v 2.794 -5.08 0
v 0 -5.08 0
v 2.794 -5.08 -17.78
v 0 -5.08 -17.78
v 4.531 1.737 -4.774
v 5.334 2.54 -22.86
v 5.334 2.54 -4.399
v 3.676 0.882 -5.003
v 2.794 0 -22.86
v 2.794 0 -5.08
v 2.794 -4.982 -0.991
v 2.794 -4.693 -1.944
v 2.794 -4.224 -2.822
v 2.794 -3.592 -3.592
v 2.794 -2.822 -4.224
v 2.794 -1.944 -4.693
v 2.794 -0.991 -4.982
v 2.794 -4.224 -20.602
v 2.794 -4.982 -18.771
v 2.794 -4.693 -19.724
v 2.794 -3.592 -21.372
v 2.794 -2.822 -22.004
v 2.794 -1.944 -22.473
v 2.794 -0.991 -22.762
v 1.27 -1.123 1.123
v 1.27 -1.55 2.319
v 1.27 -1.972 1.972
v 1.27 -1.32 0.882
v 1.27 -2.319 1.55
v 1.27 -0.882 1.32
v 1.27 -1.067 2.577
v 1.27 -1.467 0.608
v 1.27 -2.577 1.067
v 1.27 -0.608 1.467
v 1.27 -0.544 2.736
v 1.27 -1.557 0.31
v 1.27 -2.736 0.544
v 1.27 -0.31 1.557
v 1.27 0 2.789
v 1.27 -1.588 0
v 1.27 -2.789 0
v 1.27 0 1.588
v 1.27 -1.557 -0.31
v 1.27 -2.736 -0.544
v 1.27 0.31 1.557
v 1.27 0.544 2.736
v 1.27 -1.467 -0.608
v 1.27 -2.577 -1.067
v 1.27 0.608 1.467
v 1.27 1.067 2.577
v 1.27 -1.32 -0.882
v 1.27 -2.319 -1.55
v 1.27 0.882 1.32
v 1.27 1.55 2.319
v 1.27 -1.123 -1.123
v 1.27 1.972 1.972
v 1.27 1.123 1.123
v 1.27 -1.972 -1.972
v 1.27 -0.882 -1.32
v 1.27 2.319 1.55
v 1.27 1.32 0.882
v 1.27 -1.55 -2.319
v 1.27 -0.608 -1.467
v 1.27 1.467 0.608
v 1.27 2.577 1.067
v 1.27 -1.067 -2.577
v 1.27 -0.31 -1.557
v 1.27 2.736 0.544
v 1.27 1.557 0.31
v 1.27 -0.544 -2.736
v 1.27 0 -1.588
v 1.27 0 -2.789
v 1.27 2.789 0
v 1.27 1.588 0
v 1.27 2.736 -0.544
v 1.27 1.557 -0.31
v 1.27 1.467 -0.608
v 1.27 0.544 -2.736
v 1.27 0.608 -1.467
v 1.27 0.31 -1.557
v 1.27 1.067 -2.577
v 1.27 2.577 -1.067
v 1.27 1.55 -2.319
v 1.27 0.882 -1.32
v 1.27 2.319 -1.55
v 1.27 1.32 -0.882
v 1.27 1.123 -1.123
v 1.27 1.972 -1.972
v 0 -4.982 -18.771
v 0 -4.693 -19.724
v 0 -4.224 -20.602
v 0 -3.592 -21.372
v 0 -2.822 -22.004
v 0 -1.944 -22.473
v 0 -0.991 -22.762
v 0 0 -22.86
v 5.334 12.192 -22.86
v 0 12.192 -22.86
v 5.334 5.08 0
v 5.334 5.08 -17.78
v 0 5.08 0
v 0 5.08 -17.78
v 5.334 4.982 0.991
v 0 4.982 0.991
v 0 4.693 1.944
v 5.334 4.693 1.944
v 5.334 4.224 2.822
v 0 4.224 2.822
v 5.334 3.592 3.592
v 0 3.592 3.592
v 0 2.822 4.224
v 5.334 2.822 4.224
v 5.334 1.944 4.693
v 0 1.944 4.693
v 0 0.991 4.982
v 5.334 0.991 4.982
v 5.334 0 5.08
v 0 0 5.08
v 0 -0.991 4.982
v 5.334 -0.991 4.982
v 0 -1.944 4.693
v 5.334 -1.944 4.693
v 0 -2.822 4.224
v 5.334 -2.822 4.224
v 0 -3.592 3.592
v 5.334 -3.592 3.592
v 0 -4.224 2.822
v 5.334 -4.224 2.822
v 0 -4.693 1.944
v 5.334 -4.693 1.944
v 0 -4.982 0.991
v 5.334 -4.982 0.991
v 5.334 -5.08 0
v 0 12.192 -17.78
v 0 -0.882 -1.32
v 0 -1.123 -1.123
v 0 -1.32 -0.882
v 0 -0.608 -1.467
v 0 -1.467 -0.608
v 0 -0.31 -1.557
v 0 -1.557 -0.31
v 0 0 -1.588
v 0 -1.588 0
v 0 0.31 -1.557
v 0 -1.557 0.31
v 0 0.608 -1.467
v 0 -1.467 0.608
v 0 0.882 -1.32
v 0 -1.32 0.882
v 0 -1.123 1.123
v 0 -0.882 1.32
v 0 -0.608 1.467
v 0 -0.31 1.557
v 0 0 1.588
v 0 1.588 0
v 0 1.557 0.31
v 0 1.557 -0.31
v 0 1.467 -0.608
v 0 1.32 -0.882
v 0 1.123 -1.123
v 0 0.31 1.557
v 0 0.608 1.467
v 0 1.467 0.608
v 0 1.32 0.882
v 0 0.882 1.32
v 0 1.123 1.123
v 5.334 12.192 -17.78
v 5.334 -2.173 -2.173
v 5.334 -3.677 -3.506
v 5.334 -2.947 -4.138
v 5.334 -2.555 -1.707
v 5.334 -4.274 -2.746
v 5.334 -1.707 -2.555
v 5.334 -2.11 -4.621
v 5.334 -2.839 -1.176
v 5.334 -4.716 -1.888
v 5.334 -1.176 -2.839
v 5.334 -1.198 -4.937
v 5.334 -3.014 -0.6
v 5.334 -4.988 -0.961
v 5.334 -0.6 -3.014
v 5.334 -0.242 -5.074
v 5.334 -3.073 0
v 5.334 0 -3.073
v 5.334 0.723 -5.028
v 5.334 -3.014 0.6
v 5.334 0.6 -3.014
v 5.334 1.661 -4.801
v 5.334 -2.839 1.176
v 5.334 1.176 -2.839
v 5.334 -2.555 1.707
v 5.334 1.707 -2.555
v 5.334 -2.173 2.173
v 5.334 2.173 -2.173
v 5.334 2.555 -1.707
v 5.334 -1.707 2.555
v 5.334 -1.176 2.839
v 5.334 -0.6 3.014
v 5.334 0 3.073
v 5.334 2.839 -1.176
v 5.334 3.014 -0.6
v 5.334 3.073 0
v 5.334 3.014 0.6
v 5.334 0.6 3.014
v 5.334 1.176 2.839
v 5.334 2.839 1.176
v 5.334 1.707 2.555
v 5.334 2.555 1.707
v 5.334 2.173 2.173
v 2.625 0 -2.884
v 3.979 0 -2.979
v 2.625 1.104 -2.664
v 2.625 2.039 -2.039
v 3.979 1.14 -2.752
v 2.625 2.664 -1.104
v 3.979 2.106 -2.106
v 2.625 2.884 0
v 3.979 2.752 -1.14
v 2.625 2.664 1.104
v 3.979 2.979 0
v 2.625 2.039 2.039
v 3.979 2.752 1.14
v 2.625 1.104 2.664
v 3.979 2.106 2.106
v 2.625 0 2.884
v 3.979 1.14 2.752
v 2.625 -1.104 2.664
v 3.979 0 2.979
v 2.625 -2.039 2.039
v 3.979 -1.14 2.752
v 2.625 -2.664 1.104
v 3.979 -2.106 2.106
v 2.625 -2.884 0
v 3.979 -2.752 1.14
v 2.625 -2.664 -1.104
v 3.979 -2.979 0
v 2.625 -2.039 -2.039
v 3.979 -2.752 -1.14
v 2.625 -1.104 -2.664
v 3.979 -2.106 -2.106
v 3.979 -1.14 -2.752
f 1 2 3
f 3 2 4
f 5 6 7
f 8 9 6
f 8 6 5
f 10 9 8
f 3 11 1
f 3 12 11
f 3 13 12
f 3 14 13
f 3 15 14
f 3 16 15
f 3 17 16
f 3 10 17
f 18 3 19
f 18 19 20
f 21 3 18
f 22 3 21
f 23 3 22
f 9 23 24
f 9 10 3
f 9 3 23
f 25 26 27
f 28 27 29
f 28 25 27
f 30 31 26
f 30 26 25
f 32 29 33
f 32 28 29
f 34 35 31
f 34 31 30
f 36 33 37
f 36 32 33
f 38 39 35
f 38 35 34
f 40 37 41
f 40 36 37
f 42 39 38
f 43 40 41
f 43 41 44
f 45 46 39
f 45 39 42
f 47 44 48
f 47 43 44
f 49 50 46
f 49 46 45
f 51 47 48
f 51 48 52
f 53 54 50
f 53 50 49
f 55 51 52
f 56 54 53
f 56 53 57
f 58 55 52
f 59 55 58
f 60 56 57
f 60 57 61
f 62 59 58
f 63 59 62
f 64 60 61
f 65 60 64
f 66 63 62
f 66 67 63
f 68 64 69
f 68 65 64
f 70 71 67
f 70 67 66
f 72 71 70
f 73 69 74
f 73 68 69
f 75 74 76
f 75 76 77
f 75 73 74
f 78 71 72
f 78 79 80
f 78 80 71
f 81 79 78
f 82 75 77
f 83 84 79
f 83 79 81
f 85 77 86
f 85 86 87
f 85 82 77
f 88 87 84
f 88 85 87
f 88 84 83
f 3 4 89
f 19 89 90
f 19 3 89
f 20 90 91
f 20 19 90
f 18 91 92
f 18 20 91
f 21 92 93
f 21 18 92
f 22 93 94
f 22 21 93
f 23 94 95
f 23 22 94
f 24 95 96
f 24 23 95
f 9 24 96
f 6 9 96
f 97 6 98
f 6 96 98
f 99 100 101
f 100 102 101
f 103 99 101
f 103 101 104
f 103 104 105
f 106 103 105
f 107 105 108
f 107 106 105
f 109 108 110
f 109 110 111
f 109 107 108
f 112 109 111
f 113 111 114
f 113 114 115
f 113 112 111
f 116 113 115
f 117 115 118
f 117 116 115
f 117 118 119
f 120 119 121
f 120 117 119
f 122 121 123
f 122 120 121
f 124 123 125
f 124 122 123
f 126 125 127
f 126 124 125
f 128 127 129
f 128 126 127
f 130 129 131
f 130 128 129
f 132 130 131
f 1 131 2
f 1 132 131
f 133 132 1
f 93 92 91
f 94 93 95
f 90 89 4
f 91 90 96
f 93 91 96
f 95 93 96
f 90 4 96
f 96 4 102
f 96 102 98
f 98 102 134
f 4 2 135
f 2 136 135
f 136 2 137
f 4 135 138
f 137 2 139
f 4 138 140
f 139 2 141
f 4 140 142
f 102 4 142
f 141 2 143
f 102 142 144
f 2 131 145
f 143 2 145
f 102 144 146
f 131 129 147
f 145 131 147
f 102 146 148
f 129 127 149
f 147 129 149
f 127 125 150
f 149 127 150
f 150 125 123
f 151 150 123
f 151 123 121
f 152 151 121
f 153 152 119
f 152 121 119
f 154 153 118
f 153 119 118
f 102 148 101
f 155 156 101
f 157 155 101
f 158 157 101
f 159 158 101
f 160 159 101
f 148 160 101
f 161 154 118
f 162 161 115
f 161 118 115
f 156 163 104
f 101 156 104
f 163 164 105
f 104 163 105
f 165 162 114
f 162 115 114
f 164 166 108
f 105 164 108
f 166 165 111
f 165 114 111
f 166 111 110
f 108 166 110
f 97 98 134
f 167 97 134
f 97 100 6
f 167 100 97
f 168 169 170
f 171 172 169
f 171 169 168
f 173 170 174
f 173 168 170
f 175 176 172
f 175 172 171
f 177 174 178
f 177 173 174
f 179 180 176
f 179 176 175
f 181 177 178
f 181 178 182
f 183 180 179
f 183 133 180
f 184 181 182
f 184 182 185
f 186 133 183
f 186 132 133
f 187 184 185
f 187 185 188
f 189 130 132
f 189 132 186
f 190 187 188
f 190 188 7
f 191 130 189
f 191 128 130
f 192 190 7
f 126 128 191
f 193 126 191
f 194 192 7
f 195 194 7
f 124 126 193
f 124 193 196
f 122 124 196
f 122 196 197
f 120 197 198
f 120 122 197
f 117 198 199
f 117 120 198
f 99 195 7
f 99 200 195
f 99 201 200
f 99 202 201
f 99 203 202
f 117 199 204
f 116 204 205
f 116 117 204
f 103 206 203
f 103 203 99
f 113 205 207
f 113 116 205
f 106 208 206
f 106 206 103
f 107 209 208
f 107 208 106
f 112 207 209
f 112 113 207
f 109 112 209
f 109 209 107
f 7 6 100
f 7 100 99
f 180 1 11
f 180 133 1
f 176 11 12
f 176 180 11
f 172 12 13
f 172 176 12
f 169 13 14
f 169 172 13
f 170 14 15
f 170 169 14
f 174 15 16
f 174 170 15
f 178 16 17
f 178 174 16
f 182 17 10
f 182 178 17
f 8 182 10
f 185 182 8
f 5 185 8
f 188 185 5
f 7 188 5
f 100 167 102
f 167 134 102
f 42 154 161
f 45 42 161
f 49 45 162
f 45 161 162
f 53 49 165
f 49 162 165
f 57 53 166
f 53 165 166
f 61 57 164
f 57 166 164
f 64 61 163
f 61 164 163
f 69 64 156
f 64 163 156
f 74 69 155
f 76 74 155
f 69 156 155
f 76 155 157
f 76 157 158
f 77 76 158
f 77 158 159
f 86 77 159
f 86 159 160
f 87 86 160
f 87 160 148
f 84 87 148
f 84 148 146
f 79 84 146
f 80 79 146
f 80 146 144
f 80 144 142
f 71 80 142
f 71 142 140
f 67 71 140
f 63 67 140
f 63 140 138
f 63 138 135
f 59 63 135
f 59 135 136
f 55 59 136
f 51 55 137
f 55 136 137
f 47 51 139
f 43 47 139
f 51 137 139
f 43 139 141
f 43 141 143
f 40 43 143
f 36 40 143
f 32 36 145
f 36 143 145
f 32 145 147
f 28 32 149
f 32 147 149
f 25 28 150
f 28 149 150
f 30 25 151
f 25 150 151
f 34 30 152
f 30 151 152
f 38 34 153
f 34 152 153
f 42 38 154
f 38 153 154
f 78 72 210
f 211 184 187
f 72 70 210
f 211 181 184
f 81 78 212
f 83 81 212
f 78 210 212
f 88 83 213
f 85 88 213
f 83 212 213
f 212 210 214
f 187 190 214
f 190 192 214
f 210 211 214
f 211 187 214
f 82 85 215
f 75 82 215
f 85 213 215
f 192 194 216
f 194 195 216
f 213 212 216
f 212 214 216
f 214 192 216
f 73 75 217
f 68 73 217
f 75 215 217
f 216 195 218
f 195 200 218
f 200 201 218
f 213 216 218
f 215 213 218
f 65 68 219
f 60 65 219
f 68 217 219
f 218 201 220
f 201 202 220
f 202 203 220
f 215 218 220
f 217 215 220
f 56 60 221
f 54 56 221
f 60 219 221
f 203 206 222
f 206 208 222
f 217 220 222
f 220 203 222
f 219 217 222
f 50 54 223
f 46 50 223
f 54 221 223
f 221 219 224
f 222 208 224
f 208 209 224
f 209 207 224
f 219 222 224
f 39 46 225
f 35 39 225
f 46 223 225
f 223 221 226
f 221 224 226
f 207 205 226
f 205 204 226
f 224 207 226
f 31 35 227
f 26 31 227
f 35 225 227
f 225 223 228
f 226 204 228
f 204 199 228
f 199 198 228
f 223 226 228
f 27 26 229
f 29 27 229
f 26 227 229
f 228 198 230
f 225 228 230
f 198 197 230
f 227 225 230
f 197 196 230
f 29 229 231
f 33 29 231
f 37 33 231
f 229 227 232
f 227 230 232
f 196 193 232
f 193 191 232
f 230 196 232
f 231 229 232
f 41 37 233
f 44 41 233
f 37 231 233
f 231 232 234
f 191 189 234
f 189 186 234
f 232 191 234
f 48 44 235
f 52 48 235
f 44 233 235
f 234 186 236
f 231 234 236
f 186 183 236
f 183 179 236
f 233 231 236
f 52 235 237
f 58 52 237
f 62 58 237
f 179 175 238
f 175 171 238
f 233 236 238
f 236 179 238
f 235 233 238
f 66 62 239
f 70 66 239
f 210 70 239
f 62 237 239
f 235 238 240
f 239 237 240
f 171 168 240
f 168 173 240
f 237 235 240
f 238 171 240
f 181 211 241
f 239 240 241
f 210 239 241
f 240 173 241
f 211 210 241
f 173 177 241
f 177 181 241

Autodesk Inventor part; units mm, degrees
ref_plane "YZ Plane" through (0, 0, 0) normal (1, 0, 0) x (0, 1, 0)
ref_plane "XZ Plane" through (0, 0, 0) normal (0, 1, 0) x (-1, 0, 0)
ref_plane "XY Plane" through (0, 0, 0) normal (0, 0, 1) x (1, 0, 0)
sketch "Sketch1" plane through (0, 0, 0) normal (1, 0, 0) x (0, 1, 0)
  circle A0 centre (0, 0) radius 3.0734
  line L0 (5.08, 5.08) -> (-5.08, 5.08)
  line L1 (-5.08, 5.08) -> (-5.08, -22.86)
  line L2 (-5.08, -22.86) -> (5.08, -22.86)
  line L3 (5.08, -22.86) -> (5.08, 5.08)
  line L4 (-5.08, -22.86) -> (12.192, -22.86)
  line L5 (12.192, -22.86) -> (12.192, -17.78)
  line L6 (12.192, -17.78) -> (-5.08, -17.78)
  line L7 (-5.08, -17.78) -> (-5.08, -22.86)
  point P0 (5.08, -17.78)
  point P1 (5.08, -22.86)
  dimension "d0" = 6.1468
  dimension "d1" = 5.08
  dimension "d2" = 5.08
  dimension "d3" = 5.08
  dimension "d4" = 22.86
  dimension "d5" = 5.08
  dimension "d6" = 7.112
extrude "Extrusion1" add sketch "Sketch1" along normal blind 5.334
sketch "Sketch2" plane through (0, 0, 0) normal (-1, 0, 0) x (0, 0, 1)
  circle A0 centre (0, 0) radius 1.5875
  circle A1 centre (0, 0) radius 3.4736
  dimension "d9" = 3.175
extrude "Extrusion2" add sketch "Sketch2" against normal blind 5.334
fillet "Fillet1" radius 5.08 3 edges at (2.667, -5.08, -22.86) (2.667, 5.08, 5.08) (2.667, -5.08, 5.08)
sketch "Sketch3" plane through (5.334, 0, 0) normal (1, 0, 0) x (0, 0, -1)
  point P0 (0, 0)
sketch "Sketch4" plane through (5.334, 0, 0) normal (1, 0, 0) x (0, 0, -1)
  circle A0 centre (0, 0) radius 5.08
  line L0 (5.08, 0) -> (23.4096, 0)
  line L1 (23.4096, 0) -> (23.4096, -6.5655)
  line L2 (23.4096, -6.5655) -> (5.08, -6.5655)
  line L3 (5.08, -6.5655) -> (5.08, 0)
  line L4 (0, -5.08) -> (17.78, -5.08) projected
  line L5 (0, -5.08) -> (4.9426, -5.08)
  point P0 (5.08, -5.08)
extrude "Extrusion3" cut sketch "Sketch4" against normal blind 2.54 contours L3 L4 A0 | L0 L1 L2 L3
chamfer "Chamfer1" distance 2.54 angle 45 1 edges at (5.334, 0, -13.97)
sketch "Sketch6" plane through (5.334, 0, 0) normal (1, 0, 0) x (0, 0, -1)
  circle A0 centre (0, 0) radius 3.0734
  dimension "d30" = 6.1468
extrude "Extrusion5" cut sketch "Sketch6" against normal blind 4.064 draft -4
properties part number "ServoHorn"
